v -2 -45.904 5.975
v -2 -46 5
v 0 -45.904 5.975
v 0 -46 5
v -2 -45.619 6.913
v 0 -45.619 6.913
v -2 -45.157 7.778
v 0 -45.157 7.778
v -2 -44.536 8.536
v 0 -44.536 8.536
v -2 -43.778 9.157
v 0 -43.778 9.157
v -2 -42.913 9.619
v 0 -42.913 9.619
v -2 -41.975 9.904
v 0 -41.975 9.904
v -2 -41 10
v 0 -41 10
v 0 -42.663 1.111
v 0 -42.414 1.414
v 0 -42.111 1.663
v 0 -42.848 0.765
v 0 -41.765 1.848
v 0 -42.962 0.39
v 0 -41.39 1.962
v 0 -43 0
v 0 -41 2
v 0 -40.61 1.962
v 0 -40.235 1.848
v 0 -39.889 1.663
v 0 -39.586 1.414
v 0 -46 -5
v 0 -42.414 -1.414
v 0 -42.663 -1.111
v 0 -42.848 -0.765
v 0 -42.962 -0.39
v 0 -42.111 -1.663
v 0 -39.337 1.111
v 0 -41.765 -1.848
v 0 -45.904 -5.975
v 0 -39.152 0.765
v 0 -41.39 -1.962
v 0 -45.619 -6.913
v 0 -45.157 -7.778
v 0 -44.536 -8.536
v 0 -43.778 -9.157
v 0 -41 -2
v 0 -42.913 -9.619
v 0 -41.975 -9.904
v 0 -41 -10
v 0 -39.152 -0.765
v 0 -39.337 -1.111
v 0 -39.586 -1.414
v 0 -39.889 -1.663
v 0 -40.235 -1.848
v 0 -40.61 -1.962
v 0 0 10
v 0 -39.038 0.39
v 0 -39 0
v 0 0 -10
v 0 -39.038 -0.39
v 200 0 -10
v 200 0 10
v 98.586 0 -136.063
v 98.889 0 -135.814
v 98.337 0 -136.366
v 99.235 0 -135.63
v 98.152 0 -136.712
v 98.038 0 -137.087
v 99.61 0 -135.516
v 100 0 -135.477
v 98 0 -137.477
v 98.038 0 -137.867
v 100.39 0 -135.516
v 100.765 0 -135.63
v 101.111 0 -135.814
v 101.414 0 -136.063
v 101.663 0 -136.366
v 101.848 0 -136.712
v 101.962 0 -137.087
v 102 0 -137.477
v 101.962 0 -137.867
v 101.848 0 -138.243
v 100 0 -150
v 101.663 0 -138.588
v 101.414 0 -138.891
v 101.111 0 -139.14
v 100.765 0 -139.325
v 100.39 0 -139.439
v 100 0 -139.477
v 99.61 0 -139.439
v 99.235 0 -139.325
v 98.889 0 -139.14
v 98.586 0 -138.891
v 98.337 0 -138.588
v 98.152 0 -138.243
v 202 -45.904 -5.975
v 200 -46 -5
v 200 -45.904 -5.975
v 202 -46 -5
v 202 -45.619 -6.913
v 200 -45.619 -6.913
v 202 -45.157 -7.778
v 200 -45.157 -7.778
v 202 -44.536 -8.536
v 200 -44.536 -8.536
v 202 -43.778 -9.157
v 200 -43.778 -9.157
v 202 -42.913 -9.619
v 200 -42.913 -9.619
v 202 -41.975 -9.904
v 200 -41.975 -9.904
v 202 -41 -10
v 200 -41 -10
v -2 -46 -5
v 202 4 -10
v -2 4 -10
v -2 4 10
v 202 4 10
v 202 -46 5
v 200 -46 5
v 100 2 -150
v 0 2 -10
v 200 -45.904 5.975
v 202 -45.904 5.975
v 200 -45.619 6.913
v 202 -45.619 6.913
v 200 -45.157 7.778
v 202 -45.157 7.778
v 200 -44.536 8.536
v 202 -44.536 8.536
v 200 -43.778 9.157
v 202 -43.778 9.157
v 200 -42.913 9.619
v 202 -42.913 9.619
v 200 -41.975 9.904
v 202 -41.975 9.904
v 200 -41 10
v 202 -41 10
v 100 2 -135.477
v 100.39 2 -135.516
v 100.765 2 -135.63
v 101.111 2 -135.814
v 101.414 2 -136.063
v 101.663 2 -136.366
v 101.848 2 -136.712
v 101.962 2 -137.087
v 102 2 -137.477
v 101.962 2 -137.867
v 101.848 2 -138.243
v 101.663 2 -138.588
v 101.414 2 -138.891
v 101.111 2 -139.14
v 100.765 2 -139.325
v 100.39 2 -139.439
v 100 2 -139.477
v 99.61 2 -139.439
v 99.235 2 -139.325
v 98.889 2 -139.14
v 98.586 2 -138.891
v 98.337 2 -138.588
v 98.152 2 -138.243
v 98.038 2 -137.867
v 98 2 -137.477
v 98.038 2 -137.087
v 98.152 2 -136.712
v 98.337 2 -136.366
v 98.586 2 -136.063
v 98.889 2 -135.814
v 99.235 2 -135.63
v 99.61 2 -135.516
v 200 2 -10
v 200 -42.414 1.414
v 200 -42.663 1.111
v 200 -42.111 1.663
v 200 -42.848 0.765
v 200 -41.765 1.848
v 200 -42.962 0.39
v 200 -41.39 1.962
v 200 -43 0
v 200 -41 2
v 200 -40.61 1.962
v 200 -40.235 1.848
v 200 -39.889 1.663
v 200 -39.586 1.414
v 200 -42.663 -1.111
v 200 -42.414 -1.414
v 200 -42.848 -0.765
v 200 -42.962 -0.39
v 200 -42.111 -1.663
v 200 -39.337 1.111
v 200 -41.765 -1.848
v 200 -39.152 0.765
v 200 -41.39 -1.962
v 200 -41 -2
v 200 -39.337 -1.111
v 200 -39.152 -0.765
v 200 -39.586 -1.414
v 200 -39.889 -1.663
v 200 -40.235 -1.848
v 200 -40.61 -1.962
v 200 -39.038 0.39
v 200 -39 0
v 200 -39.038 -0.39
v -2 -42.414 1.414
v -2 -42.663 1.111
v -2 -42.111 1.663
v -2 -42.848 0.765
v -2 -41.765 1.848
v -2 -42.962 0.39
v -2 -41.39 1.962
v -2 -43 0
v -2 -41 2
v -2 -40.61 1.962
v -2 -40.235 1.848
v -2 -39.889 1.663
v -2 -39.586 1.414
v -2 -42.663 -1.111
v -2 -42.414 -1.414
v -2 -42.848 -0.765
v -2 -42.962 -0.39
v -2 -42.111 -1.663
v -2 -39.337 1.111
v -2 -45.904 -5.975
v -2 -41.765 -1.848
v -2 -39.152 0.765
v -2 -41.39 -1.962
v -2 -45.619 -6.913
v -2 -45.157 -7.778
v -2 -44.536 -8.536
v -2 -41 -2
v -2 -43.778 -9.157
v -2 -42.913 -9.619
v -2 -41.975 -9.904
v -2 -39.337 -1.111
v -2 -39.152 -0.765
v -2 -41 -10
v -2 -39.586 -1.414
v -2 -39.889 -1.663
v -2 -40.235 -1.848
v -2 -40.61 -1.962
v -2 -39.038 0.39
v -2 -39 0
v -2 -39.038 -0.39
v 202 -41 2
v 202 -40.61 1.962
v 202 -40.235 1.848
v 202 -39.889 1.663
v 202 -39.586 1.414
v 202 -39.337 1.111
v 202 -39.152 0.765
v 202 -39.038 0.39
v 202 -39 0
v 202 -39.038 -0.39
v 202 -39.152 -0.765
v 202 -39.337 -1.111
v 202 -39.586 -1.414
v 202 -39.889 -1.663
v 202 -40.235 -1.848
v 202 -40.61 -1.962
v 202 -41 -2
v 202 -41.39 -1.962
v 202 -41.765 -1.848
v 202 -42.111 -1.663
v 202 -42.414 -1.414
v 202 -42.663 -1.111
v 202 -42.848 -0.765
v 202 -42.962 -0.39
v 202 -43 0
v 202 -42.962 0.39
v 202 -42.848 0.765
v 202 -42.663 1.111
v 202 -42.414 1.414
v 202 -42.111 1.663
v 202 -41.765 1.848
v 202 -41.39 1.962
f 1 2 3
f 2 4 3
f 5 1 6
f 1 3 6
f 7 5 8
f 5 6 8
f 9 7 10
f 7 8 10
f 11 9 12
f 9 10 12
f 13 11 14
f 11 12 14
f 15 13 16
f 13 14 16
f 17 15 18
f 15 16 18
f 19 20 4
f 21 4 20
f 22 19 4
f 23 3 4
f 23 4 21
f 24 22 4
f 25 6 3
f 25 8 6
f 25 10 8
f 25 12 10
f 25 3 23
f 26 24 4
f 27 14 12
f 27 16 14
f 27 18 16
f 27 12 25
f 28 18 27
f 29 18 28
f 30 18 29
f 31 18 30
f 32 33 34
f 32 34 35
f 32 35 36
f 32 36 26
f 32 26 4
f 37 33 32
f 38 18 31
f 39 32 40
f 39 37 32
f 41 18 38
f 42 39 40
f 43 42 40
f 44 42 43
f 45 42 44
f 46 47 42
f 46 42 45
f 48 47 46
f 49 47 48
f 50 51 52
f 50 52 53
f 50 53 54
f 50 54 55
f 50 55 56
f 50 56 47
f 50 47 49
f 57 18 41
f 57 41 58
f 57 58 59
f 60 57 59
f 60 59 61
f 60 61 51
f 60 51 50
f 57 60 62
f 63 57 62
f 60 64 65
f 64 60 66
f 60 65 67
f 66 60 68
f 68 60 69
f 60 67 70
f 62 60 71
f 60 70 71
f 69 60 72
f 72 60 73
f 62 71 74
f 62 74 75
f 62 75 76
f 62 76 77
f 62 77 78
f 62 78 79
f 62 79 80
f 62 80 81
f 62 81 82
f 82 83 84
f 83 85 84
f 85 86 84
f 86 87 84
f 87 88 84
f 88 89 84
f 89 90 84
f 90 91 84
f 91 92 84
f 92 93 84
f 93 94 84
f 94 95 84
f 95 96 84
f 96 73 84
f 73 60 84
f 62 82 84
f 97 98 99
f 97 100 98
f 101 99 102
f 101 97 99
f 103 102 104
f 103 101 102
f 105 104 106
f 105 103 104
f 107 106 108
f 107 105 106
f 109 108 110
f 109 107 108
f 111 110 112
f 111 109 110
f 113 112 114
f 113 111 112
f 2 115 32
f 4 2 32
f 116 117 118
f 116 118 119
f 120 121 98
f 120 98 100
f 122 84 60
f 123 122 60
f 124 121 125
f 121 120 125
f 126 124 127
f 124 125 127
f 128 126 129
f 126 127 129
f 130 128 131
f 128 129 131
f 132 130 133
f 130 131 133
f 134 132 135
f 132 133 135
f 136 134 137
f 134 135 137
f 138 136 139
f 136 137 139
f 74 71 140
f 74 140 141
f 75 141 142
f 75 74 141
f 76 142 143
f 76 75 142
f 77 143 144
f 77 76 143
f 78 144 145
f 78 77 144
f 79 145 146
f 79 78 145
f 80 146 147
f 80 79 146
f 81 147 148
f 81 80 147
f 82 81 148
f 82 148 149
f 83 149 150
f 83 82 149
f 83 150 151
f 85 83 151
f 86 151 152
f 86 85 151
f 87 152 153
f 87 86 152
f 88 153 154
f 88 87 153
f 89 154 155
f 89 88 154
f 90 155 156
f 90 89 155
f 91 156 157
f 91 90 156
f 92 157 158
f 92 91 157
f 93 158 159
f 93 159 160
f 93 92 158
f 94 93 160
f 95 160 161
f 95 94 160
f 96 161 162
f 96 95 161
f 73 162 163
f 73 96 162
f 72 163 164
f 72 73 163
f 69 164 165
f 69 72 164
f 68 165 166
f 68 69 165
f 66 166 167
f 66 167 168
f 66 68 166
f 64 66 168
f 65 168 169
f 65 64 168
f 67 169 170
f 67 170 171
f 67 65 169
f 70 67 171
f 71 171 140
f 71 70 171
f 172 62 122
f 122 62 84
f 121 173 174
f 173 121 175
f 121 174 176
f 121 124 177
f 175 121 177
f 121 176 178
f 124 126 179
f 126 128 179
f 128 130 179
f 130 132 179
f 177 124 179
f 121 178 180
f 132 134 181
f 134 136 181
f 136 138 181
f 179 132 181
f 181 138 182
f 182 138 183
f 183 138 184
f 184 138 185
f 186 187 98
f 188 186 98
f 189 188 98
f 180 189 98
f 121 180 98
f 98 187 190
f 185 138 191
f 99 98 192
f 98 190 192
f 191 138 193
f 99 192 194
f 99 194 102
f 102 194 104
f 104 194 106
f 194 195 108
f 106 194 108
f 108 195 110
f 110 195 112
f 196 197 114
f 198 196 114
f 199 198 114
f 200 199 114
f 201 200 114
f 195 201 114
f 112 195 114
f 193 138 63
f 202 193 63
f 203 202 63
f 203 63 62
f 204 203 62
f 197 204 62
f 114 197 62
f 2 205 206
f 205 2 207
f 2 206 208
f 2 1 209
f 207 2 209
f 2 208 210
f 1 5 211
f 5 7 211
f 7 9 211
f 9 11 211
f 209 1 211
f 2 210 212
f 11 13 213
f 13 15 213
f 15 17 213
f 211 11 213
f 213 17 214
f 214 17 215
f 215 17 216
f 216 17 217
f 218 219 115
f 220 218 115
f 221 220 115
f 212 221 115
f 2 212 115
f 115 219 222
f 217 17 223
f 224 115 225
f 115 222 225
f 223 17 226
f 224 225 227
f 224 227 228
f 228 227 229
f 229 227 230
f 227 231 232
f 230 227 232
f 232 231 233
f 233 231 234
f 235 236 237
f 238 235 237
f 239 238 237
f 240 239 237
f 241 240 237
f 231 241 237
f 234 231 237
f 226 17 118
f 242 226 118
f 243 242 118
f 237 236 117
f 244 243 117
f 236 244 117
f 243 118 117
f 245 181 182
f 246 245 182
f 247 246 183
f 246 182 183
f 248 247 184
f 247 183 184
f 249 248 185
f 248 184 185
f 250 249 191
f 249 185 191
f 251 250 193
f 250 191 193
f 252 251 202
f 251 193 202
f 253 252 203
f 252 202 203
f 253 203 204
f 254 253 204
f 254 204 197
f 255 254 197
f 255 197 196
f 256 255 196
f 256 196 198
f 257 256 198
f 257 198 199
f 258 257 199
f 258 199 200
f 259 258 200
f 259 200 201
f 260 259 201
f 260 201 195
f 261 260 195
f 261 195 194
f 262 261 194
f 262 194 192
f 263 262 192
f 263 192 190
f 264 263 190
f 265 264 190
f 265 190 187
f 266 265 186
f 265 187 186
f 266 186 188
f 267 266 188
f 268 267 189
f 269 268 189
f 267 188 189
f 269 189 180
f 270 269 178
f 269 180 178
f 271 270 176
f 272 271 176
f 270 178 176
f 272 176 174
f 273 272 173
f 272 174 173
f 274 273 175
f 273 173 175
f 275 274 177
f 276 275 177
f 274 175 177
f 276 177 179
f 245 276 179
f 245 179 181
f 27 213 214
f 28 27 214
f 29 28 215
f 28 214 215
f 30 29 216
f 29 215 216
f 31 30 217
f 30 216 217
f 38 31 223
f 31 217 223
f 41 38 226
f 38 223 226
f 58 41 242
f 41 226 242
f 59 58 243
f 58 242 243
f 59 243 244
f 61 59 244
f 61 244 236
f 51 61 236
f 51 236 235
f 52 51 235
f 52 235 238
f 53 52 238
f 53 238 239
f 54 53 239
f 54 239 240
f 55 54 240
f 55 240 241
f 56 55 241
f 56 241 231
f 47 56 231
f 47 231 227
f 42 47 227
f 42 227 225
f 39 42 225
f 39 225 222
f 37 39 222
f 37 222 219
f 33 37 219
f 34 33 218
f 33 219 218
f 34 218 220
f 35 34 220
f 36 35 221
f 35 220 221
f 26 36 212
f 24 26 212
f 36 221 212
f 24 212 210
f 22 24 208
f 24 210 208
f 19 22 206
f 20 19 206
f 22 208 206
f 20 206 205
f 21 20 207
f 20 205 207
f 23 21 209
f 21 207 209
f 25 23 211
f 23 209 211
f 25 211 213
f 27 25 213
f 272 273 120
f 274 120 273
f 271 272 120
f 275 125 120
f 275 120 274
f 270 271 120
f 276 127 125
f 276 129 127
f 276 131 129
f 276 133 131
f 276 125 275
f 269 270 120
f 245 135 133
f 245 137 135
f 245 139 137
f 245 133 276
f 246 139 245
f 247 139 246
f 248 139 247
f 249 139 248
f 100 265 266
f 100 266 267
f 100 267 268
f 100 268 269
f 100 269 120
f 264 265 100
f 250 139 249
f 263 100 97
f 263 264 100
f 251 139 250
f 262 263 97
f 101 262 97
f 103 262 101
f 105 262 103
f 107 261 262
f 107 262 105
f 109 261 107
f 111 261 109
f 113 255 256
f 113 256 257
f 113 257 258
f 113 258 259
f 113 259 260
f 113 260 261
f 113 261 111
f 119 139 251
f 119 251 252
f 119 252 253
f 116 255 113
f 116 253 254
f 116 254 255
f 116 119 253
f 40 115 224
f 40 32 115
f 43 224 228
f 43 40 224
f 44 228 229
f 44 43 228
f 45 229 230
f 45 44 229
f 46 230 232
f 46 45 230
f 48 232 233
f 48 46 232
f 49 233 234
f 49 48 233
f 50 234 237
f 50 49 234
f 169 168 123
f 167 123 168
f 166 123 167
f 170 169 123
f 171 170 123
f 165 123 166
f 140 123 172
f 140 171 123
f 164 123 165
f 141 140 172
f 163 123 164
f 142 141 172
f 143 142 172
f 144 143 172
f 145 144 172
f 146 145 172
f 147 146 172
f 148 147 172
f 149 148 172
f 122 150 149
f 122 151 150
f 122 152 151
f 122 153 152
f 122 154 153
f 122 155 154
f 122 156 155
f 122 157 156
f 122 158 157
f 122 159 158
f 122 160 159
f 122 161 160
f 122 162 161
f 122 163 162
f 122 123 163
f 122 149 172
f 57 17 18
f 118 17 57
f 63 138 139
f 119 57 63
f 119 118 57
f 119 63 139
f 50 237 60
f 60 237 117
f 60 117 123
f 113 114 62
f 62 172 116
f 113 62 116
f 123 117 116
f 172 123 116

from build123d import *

# Parameters (mm, degrees)
SKETCH2_R           = 2
BOSS_EXTRUDE1_DEPTH = 2
SKETCH4_W           = 200
SKETCH4_H           = 20
BOSS_EXTRUDE4_DEPTH = 2
SKETCH7_W           = 2
SKETCH7_H           = 20
BOSS_EXTRUDE5_DEPTH = 50
FILLET1_R           = 5
SKETCH9_R           = 2
CUT_EXTRUDE1_DEPTH  = 250


with BuildPart() as part:
    # Sketch2 → Boss-Extrude1 (new body)
    with BuildSketch(Plane(origin=(0, 0, 0), x_dir=(1, 0, 0), z_dir=(0, 1, 0))):
        Polygon((200, 0), (200, 10), (100, 150), (0, 10), (0, 0), (0, -10), (200, -10), align=None)
        with Locations(Location((100, 137.477270849, 0), (0, 0, 270))):
            Circle(SKETCH2_R, mode=Mode.SUBTRACT)
    extrude(amount=BOSS_EXTRUDE1_DEPTH)

    # Sketch4 → Boss-Extrude4 (add)
    with BuildSketch(Plane(origin=(0, 2, 0), x_dir=(1, 0, 0), z_dir=(0, 1, 0))):
        with Locations((100, 0)):
            Rectangle(SKETCH4_W, SKETCH4_H)
    extrude(amount=BOSS_EXTRUDE4_DEPTH)

    # Sketch7 → Boss-Extrude5 (add)
    with BuildSketch(Plane(origin=(0, 4, 0), x_dir=(1, 0, 0), z_dir=(0, 1, 0))):
        with Locations((-1, 0)):
            Rectangle(SKETCH7_W, SKETCH7_H)
        with Locations((201, 0)):
            Rectangle(SKETCH7_W, SKETCH7_H)
    extrude(amount=-BOSS_EXTRUDE5_DEPTH)

    # Fillet1
    fillet1_edges = [part.edges().sort_by_distance(p)[0] for p in [
        (-1, -46, 10),
        (-1, -46, -10),
        (201, -46, -10),
        (201, -46, 10),
    ]]
    fillet(fillet1_edges, radius=FILLET1_R)

    # Sketch9 → Cut-Extrude1 (cut)
    with BuildSketch(Plane.ZY.offset(2)):
        with Locations((0, -41)):
            Circle(SKETCH9_R)
    extrude(amount=-CUT_EXTRUDE1_DEPTH, mode=Mode.SUBTRACT)


solid = part.part
